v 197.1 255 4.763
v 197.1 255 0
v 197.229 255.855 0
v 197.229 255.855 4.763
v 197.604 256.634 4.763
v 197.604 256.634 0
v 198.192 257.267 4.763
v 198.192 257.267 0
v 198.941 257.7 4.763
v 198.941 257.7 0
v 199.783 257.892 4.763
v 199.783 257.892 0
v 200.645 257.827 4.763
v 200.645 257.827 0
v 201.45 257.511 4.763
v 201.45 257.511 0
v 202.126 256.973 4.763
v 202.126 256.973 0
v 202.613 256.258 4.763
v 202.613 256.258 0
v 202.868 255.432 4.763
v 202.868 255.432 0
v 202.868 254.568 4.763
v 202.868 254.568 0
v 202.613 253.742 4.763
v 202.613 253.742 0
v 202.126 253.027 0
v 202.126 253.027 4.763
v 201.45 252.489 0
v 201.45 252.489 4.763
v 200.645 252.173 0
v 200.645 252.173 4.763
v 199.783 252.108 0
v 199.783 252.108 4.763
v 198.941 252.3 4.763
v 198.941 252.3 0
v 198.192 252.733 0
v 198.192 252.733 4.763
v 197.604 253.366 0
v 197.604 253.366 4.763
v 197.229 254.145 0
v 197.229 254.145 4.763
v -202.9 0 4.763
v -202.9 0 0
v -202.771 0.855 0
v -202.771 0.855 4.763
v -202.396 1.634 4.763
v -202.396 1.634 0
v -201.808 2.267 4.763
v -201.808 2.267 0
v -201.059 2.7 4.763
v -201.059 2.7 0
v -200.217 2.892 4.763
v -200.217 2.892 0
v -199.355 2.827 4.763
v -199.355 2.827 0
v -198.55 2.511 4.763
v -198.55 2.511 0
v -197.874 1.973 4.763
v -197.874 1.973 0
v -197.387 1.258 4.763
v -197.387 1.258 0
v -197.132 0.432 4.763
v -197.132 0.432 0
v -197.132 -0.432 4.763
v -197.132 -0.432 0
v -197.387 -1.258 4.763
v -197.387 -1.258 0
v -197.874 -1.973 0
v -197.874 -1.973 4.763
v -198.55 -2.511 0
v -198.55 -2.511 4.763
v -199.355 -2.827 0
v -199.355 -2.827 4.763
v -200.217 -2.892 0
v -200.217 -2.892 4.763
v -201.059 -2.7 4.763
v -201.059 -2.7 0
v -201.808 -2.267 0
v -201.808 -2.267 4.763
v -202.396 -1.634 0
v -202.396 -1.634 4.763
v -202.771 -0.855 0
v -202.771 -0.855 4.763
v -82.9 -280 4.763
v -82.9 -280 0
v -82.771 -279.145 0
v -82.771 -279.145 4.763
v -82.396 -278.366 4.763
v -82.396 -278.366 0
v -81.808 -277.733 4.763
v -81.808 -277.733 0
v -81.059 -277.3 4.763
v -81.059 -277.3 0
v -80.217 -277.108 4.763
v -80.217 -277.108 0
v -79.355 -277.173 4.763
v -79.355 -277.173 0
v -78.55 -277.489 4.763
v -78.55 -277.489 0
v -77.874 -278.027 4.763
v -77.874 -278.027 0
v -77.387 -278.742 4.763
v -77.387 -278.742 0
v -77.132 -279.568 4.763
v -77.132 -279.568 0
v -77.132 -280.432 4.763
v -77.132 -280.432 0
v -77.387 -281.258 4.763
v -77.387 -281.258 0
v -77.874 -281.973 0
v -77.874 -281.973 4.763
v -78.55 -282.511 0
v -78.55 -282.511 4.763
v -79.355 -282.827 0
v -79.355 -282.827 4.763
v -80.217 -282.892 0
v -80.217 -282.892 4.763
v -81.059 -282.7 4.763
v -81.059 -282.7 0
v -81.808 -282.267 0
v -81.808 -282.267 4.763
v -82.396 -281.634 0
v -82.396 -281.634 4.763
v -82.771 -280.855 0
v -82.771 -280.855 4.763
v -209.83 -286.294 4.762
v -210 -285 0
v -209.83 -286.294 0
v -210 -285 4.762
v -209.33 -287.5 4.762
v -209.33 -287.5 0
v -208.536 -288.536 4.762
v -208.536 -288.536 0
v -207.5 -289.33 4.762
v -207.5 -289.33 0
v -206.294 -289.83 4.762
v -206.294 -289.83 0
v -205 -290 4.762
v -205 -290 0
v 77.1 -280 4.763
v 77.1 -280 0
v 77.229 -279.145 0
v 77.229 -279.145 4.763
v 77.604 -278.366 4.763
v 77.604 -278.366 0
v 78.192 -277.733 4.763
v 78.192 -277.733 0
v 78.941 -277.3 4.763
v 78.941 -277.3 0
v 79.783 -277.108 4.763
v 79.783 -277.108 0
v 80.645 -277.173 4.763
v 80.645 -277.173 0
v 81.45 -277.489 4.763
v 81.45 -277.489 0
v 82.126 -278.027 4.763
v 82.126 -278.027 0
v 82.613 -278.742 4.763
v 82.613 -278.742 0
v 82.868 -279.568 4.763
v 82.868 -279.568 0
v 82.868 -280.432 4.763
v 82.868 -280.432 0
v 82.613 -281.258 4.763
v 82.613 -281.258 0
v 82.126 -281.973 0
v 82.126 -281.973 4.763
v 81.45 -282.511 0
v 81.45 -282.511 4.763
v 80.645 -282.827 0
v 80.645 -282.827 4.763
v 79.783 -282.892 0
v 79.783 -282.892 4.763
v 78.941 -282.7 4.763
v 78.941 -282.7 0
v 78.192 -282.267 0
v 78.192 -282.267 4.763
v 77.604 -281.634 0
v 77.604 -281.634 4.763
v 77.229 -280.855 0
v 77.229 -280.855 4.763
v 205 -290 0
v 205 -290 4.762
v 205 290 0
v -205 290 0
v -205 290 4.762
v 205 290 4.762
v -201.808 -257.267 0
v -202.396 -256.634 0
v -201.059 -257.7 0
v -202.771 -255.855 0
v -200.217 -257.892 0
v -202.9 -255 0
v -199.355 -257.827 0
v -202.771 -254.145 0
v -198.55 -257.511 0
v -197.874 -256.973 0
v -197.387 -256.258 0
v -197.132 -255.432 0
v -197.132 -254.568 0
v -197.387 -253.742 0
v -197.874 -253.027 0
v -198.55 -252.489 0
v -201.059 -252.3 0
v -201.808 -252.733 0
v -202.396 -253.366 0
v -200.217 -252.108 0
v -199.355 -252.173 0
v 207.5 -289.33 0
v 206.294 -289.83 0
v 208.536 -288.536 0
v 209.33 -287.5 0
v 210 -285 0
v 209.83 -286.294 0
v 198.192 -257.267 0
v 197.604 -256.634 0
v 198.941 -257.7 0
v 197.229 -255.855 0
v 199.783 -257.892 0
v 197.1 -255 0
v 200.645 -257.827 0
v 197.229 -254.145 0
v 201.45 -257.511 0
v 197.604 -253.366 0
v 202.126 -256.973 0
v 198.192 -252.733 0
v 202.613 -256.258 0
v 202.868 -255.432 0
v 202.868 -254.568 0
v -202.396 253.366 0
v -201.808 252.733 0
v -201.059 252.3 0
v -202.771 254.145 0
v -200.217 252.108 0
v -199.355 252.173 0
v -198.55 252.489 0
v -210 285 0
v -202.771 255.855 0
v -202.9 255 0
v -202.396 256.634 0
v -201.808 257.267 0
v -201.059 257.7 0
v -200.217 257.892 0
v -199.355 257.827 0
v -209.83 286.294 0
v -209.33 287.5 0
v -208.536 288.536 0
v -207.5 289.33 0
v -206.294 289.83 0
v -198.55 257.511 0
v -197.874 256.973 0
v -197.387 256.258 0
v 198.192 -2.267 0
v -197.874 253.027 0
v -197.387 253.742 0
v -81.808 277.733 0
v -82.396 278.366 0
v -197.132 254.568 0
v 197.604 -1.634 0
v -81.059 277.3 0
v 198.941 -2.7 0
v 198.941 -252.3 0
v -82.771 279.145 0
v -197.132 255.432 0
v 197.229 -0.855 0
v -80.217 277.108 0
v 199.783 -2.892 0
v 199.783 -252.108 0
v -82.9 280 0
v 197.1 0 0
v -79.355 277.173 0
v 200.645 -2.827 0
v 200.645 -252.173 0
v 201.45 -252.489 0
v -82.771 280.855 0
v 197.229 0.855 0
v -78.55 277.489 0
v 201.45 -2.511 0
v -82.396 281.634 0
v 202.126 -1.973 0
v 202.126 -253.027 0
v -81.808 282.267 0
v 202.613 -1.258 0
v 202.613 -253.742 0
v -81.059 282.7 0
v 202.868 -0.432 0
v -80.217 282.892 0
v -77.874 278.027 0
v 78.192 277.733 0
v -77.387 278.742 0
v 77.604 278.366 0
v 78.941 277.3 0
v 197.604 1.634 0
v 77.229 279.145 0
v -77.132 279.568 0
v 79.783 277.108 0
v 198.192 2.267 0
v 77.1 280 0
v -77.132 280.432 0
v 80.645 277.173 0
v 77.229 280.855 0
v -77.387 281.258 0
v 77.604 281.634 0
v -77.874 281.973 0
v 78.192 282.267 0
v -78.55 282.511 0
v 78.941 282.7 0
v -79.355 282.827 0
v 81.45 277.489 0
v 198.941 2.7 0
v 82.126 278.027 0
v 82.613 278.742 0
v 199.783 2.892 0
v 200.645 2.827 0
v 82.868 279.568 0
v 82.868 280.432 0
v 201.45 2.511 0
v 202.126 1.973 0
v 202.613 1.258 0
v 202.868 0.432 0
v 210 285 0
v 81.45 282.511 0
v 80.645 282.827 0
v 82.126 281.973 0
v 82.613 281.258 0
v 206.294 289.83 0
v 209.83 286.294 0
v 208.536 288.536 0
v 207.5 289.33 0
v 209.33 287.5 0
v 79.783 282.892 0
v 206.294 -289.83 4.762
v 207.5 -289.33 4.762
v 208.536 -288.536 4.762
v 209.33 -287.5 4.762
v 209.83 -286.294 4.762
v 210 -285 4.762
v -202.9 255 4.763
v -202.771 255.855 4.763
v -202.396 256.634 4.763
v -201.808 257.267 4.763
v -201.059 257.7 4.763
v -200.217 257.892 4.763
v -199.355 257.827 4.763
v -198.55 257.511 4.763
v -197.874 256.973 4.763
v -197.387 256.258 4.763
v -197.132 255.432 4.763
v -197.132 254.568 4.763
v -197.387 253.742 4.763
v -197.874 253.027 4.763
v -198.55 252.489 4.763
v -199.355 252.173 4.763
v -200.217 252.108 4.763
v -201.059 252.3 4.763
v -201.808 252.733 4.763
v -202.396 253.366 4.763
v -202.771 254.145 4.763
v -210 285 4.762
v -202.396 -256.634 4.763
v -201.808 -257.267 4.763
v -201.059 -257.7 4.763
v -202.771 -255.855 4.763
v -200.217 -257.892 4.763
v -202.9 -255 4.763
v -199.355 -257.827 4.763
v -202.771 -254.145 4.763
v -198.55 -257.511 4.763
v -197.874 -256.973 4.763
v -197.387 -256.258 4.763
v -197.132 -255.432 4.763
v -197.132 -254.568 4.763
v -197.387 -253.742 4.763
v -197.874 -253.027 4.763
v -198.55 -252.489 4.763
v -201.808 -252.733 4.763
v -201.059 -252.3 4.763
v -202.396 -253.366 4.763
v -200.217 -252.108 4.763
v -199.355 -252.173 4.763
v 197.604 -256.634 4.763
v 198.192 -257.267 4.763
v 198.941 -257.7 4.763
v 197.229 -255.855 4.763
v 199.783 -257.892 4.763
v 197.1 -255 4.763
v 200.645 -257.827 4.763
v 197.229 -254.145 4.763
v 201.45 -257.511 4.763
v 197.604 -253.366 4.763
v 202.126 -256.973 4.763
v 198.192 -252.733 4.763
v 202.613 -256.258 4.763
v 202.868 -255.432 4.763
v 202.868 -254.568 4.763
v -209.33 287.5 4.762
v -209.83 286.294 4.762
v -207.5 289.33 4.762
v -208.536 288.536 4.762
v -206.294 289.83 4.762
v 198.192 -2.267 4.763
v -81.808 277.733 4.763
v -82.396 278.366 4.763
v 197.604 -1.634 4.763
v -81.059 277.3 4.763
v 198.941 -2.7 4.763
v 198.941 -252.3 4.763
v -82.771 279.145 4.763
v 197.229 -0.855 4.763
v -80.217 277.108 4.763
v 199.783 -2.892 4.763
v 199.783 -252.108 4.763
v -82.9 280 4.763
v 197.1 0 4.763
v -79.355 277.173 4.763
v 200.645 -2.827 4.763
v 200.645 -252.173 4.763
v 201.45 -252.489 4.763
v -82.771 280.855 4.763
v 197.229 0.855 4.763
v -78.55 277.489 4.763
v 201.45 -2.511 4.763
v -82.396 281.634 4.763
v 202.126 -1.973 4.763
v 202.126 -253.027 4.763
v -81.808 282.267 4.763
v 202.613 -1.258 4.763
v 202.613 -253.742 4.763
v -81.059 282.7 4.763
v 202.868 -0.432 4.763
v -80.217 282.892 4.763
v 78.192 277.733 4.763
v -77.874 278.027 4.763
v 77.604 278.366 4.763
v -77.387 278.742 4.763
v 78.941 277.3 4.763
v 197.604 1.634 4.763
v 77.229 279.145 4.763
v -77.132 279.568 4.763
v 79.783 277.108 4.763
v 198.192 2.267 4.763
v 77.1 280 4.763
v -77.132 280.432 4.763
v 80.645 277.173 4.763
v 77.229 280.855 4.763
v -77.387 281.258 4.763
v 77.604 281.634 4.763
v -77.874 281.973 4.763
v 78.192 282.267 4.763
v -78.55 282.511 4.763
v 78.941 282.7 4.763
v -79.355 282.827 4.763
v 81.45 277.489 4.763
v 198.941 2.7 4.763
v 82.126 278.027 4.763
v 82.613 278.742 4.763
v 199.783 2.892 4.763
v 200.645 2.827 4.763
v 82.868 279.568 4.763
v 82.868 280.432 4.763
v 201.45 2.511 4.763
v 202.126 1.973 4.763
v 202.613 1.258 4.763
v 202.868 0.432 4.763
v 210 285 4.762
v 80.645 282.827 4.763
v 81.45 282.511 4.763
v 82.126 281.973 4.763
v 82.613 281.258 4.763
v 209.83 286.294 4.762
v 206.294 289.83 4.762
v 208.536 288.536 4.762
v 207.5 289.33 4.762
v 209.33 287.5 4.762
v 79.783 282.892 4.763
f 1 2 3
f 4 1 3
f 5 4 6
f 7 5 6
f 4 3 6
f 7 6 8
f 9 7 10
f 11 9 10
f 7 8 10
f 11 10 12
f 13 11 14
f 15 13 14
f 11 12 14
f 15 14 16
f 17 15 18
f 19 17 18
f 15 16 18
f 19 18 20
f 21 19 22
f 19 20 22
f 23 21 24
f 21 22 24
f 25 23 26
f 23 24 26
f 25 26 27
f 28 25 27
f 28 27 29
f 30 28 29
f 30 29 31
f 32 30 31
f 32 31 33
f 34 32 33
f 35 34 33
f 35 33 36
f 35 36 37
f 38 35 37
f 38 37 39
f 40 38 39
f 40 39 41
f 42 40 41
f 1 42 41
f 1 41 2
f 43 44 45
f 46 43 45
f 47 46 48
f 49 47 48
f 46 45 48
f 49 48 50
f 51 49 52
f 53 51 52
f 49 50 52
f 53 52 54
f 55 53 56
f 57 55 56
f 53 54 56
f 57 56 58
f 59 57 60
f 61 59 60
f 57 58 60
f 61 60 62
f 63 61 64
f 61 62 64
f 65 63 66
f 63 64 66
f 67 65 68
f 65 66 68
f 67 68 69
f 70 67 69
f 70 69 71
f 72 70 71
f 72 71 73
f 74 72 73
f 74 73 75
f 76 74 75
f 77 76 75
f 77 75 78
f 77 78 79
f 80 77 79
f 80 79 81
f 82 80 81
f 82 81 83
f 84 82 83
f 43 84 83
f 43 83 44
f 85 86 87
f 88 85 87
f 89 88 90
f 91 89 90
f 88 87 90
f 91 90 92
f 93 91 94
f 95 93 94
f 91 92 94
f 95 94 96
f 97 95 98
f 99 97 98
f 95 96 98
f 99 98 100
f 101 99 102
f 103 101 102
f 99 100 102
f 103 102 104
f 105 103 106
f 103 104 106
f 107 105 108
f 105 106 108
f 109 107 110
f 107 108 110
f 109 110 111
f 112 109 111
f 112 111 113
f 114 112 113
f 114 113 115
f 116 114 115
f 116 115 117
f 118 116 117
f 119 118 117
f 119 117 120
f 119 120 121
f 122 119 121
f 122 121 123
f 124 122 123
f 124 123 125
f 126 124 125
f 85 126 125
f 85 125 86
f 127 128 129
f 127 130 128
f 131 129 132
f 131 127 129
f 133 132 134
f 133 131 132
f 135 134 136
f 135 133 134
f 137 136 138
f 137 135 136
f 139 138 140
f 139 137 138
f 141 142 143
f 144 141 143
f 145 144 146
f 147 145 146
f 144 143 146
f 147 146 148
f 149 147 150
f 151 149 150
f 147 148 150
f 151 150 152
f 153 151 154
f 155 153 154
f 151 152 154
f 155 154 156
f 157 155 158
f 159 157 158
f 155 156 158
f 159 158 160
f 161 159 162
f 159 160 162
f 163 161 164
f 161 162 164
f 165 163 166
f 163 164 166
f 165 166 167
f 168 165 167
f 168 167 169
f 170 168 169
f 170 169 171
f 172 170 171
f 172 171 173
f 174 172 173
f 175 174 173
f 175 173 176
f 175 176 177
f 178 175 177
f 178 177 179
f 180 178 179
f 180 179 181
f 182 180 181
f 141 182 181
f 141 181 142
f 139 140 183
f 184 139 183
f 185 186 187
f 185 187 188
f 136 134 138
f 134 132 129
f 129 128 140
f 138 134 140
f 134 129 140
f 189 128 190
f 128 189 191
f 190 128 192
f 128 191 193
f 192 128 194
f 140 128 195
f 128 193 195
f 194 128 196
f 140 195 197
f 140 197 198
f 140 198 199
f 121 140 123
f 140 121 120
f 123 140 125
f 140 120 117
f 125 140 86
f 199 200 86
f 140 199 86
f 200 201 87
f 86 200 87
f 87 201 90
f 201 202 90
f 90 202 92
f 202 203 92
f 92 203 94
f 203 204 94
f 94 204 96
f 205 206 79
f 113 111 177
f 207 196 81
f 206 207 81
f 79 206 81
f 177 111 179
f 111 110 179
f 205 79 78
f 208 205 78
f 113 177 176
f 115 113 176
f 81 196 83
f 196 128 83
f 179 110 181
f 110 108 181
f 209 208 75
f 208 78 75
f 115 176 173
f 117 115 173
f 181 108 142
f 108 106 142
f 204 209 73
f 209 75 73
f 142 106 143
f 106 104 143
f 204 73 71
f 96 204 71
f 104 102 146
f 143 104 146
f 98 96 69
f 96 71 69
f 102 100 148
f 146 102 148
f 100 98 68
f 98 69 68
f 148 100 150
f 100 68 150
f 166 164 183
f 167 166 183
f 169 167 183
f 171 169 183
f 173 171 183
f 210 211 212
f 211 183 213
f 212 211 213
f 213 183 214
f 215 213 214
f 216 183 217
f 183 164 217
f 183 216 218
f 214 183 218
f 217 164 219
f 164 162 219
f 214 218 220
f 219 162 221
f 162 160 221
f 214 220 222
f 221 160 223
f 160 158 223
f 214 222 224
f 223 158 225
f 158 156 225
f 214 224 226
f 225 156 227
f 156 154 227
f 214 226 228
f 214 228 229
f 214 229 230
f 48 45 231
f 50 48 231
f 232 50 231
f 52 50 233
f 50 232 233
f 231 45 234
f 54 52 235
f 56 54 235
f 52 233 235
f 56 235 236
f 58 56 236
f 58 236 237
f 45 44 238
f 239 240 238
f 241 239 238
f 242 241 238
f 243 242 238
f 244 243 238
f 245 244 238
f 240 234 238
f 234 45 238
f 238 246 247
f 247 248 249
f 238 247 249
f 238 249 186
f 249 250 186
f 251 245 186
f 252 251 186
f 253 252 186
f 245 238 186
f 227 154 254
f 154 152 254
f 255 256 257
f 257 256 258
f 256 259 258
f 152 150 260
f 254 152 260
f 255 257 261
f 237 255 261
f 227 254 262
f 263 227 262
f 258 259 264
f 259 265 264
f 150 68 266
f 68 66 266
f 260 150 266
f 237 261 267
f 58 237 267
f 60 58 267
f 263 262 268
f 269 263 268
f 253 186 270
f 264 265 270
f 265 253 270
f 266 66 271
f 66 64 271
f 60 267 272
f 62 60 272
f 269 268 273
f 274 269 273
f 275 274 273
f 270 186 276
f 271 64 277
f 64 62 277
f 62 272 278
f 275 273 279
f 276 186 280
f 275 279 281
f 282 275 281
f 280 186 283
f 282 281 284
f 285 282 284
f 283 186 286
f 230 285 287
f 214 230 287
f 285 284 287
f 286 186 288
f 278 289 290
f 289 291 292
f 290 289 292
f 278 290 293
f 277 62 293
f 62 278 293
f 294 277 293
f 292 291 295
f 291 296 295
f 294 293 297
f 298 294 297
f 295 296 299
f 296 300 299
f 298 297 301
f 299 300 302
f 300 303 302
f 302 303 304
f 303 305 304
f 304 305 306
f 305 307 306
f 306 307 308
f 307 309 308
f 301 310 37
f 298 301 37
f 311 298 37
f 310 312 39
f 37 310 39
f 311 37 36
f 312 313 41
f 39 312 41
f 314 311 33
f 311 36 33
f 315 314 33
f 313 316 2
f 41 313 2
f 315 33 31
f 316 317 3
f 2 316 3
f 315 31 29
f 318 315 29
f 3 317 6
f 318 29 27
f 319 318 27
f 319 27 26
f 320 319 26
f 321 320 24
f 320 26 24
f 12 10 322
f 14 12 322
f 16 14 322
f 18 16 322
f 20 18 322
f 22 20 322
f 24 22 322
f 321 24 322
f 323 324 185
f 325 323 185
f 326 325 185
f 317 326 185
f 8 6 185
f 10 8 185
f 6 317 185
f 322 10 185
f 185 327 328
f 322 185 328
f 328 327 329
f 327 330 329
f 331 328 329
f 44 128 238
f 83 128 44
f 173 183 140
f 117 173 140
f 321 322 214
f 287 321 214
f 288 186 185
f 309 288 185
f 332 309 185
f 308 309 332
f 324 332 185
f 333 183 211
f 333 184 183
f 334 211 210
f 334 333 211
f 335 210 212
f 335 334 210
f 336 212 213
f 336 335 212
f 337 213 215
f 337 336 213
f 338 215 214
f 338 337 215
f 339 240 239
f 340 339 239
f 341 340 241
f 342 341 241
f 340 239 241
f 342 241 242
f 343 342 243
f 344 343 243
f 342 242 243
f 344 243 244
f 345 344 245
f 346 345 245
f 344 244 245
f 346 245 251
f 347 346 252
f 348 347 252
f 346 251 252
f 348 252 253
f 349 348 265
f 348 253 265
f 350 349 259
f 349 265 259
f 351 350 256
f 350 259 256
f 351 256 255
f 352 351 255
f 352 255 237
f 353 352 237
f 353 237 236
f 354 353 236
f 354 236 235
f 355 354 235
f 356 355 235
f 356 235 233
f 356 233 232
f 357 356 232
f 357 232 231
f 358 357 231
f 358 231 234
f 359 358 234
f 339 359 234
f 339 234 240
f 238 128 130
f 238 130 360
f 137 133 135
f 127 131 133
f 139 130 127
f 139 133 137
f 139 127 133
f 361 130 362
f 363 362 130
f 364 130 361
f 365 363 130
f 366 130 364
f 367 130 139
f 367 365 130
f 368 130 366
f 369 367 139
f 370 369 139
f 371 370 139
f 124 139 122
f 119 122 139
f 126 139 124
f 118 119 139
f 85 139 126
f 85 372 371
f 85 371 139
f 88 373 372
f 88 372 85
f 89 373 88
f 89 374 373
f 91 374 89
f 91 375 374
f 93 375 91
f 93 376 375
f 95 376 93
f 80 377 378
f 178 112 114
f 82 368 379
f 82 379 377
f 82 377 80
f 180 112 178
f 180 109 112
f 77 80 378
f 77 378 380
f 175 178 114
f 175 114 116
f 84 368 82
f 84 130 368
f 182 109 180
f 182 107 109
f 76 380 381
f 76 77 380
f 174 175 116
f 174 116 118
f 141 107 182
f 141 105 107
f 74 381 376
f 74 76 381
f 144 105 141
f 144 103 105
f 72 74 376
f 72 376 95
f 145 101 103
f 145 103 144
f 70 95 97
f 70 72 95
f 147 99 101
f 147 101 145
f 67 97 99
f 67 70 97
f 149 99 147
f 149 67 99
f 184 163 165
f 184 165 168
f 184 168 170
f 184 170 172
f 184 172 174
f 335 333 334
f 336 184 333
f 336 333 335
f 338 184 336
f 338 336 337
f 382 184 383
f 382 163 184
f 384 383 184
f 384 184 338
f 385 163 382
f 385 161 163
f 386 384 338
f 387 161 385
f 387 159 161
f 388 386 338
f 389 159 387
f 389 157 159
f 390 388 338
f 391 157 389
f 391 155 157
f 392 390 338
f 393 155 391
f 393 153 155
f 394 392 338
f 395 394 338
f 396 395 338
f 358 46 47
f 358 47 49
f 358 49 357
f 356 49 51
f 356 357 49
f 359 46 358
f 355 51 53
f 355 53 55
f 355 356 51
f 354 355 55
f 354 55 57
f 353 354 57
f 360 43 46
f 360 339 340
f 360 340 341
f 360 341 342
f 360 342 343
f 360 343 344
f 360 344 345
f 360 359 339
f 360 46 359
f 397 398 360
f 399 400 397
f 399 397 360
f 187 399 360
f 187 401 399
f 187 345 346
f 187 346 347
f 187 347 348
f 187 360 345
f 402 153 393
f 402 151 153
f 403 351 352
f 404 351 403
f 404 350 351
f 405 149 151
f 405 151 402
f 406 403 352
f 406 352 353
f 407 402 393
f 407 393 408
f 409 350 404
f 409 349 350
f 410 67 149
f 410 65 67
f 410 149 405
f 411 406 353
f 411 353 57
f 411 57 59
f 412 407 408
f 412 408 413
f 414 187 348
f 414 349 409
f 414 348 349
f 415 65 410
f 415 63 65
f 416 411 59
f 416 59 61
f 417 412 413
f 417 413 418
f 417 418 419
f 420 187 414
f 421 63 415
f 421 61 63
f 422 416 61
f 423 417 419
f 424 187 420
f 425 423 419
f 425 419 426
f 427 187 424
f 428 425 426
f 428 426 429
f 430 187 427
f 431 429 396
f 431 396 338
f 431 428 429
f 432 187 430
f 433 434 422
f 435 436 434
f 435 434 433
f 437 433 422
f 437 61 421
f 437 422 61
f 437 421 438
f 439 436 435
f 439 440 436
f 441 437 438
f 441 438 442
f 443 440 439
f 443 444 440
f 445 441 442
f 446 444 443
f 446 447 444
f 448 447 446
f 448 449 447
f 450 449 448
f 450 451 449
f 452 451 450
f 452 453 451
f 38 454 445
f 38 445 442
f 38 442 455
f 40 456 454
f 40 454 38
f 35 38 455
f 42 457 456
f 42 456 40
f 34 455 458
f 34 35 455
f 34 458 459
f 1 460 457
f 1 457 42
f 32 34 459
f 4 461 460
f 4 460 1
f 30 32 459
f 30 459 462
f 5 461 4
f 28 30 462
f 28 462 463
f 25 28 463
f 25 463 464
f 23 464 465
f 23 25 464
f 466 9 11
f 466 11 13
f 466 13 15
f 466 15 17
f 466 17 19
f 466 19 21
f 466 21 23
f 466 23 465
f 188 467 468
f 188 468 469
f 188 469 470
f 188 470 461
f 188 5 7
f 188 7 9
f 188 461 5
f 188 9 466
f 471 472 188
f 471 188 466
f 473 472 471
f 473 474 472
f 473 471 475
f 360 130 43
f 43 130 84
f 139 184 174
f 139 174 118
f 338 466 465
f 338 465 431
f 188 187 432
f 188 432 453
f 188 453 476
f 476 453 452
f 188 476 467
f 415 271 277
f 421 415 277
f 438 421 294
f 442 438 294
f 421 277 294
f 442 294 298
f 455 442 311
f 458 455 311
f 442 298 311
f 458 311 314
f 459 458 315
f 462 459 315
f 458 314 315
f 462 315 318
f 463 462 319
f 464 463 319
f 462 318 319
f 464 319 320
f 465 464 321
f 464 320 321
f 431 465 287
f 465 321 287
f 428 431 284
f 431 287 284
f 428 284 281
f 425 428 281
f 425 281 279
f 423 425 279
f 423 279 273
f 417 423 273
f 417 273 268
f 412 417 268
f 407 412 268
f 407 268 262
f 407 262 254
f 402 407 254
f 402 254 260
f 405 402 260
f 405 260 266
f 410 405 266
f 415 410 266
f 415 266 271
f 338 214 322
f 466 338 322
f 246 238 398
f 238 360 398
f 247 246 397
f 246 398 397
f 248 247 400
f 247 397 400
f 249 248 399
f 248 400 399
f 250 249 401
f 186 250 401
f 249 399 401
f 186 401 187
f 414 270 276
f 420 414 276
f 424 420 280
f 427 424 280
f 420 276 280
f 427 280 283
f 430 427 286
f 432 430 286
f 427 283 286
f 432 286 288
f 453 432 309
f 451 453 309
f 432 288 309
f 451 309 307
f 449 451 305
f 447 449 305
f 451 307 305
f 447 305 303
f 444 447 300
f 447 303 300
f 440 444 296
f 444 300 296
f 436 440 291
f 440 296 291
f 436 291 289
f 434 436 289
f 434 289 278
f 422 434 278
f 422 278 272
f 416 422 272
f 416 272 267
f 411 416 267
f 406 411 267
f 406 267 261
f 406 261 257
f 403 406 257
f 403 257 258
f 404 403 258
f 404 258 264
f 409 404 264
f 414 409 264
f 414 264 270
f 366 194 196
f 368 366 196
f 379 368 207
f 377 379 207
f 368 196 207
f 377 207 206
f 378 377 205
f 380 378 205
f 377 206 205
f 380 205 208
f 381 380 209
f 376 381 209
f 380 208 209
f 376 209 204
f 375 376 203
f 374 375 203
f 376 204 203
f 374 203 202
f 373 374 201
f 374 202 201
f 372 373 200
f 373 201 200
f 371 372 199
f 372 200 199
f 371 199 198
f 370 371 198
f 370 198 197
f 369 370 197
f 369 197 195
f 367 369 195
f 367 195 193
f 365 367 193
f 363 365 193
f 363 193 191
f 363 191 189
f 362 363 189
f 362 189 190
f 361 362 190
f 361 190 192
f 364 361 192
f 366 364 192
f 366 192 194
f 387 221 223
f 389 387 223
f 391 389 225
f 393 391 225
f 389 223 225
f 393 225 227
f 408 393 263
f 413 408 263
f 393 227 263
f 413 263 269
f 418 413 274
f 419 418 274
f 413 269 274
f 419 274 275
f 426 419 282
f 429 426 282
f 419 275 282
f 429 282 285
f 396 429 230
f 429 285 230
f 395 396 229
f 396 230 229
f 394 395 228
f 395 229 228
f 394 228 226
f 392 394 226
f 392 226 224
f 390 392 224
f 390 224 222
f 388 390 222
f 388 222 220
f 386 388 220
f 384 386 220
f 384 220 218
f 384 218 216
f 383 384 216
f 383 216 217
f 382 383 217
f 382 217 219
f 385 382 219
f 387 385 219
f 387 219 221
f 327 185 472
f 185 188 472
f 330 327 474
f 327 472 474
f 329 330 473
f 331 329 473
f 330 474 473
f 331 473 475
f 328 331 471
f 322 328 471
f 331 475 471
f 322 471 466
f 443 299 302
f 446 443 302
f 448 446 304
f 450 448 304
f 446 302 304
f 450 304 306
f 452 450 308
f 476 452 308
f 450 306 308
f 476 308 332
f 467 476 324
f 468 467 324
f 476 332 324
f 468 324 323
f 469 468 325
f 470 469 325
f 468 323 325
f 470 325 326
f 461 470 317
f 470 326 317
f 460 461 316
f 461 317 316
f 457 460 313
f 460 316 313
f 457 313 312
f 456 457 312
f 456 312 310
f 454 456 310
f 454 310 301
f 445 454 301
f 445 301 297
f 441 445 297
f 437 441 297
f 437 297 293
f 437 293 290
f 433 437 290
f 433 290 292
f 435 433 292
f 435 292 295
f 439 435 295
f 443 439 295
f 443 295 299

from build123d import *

# Parameters (mm, degrees)
SKETCH1_W            = 420
SKETCH1_H            = 580
BOSS_EXTRUDE1_DEPTH  = 4.7625
M5_CLEARANCE_HOLE1_D = 5.8
FILLET1_R            = 5


with BuildPart() as part:
    # Sketch1 → Boss-Extrude1 (new body)
    with BuildSketch(Plane.XY):
        Rectangle(SKETCH1_W, SKETCH1_H)
    extrude(amount=BOSS_EXTRUDE1_DEPTH)

    # M5 Clearance Hole1 (through all)
    with Locations(Plane.XY.offset(4.7625)):
        with Locations((-200, 255), (-200, 0), (-200, -255), (200, 255), (200, 0), (200, -255), (-80, 280), (80, 280), (80, -280), (-80, -280)):
            Hole(M5_CLEARANCE_HOLE1_D / 2)

    # Fillet1
    fillet1_edges = [part.edges().sort_by_distance(p)[0] for p in [
        (-210, 290, 2.38125),
        (210, 290, 2.38125),
        (210, -290, 2.38125),
        (-210, -290, 2.38125),
    ]]
    fillet(fillet1_edges, radius=FILLET1_R)


solid = part.part
